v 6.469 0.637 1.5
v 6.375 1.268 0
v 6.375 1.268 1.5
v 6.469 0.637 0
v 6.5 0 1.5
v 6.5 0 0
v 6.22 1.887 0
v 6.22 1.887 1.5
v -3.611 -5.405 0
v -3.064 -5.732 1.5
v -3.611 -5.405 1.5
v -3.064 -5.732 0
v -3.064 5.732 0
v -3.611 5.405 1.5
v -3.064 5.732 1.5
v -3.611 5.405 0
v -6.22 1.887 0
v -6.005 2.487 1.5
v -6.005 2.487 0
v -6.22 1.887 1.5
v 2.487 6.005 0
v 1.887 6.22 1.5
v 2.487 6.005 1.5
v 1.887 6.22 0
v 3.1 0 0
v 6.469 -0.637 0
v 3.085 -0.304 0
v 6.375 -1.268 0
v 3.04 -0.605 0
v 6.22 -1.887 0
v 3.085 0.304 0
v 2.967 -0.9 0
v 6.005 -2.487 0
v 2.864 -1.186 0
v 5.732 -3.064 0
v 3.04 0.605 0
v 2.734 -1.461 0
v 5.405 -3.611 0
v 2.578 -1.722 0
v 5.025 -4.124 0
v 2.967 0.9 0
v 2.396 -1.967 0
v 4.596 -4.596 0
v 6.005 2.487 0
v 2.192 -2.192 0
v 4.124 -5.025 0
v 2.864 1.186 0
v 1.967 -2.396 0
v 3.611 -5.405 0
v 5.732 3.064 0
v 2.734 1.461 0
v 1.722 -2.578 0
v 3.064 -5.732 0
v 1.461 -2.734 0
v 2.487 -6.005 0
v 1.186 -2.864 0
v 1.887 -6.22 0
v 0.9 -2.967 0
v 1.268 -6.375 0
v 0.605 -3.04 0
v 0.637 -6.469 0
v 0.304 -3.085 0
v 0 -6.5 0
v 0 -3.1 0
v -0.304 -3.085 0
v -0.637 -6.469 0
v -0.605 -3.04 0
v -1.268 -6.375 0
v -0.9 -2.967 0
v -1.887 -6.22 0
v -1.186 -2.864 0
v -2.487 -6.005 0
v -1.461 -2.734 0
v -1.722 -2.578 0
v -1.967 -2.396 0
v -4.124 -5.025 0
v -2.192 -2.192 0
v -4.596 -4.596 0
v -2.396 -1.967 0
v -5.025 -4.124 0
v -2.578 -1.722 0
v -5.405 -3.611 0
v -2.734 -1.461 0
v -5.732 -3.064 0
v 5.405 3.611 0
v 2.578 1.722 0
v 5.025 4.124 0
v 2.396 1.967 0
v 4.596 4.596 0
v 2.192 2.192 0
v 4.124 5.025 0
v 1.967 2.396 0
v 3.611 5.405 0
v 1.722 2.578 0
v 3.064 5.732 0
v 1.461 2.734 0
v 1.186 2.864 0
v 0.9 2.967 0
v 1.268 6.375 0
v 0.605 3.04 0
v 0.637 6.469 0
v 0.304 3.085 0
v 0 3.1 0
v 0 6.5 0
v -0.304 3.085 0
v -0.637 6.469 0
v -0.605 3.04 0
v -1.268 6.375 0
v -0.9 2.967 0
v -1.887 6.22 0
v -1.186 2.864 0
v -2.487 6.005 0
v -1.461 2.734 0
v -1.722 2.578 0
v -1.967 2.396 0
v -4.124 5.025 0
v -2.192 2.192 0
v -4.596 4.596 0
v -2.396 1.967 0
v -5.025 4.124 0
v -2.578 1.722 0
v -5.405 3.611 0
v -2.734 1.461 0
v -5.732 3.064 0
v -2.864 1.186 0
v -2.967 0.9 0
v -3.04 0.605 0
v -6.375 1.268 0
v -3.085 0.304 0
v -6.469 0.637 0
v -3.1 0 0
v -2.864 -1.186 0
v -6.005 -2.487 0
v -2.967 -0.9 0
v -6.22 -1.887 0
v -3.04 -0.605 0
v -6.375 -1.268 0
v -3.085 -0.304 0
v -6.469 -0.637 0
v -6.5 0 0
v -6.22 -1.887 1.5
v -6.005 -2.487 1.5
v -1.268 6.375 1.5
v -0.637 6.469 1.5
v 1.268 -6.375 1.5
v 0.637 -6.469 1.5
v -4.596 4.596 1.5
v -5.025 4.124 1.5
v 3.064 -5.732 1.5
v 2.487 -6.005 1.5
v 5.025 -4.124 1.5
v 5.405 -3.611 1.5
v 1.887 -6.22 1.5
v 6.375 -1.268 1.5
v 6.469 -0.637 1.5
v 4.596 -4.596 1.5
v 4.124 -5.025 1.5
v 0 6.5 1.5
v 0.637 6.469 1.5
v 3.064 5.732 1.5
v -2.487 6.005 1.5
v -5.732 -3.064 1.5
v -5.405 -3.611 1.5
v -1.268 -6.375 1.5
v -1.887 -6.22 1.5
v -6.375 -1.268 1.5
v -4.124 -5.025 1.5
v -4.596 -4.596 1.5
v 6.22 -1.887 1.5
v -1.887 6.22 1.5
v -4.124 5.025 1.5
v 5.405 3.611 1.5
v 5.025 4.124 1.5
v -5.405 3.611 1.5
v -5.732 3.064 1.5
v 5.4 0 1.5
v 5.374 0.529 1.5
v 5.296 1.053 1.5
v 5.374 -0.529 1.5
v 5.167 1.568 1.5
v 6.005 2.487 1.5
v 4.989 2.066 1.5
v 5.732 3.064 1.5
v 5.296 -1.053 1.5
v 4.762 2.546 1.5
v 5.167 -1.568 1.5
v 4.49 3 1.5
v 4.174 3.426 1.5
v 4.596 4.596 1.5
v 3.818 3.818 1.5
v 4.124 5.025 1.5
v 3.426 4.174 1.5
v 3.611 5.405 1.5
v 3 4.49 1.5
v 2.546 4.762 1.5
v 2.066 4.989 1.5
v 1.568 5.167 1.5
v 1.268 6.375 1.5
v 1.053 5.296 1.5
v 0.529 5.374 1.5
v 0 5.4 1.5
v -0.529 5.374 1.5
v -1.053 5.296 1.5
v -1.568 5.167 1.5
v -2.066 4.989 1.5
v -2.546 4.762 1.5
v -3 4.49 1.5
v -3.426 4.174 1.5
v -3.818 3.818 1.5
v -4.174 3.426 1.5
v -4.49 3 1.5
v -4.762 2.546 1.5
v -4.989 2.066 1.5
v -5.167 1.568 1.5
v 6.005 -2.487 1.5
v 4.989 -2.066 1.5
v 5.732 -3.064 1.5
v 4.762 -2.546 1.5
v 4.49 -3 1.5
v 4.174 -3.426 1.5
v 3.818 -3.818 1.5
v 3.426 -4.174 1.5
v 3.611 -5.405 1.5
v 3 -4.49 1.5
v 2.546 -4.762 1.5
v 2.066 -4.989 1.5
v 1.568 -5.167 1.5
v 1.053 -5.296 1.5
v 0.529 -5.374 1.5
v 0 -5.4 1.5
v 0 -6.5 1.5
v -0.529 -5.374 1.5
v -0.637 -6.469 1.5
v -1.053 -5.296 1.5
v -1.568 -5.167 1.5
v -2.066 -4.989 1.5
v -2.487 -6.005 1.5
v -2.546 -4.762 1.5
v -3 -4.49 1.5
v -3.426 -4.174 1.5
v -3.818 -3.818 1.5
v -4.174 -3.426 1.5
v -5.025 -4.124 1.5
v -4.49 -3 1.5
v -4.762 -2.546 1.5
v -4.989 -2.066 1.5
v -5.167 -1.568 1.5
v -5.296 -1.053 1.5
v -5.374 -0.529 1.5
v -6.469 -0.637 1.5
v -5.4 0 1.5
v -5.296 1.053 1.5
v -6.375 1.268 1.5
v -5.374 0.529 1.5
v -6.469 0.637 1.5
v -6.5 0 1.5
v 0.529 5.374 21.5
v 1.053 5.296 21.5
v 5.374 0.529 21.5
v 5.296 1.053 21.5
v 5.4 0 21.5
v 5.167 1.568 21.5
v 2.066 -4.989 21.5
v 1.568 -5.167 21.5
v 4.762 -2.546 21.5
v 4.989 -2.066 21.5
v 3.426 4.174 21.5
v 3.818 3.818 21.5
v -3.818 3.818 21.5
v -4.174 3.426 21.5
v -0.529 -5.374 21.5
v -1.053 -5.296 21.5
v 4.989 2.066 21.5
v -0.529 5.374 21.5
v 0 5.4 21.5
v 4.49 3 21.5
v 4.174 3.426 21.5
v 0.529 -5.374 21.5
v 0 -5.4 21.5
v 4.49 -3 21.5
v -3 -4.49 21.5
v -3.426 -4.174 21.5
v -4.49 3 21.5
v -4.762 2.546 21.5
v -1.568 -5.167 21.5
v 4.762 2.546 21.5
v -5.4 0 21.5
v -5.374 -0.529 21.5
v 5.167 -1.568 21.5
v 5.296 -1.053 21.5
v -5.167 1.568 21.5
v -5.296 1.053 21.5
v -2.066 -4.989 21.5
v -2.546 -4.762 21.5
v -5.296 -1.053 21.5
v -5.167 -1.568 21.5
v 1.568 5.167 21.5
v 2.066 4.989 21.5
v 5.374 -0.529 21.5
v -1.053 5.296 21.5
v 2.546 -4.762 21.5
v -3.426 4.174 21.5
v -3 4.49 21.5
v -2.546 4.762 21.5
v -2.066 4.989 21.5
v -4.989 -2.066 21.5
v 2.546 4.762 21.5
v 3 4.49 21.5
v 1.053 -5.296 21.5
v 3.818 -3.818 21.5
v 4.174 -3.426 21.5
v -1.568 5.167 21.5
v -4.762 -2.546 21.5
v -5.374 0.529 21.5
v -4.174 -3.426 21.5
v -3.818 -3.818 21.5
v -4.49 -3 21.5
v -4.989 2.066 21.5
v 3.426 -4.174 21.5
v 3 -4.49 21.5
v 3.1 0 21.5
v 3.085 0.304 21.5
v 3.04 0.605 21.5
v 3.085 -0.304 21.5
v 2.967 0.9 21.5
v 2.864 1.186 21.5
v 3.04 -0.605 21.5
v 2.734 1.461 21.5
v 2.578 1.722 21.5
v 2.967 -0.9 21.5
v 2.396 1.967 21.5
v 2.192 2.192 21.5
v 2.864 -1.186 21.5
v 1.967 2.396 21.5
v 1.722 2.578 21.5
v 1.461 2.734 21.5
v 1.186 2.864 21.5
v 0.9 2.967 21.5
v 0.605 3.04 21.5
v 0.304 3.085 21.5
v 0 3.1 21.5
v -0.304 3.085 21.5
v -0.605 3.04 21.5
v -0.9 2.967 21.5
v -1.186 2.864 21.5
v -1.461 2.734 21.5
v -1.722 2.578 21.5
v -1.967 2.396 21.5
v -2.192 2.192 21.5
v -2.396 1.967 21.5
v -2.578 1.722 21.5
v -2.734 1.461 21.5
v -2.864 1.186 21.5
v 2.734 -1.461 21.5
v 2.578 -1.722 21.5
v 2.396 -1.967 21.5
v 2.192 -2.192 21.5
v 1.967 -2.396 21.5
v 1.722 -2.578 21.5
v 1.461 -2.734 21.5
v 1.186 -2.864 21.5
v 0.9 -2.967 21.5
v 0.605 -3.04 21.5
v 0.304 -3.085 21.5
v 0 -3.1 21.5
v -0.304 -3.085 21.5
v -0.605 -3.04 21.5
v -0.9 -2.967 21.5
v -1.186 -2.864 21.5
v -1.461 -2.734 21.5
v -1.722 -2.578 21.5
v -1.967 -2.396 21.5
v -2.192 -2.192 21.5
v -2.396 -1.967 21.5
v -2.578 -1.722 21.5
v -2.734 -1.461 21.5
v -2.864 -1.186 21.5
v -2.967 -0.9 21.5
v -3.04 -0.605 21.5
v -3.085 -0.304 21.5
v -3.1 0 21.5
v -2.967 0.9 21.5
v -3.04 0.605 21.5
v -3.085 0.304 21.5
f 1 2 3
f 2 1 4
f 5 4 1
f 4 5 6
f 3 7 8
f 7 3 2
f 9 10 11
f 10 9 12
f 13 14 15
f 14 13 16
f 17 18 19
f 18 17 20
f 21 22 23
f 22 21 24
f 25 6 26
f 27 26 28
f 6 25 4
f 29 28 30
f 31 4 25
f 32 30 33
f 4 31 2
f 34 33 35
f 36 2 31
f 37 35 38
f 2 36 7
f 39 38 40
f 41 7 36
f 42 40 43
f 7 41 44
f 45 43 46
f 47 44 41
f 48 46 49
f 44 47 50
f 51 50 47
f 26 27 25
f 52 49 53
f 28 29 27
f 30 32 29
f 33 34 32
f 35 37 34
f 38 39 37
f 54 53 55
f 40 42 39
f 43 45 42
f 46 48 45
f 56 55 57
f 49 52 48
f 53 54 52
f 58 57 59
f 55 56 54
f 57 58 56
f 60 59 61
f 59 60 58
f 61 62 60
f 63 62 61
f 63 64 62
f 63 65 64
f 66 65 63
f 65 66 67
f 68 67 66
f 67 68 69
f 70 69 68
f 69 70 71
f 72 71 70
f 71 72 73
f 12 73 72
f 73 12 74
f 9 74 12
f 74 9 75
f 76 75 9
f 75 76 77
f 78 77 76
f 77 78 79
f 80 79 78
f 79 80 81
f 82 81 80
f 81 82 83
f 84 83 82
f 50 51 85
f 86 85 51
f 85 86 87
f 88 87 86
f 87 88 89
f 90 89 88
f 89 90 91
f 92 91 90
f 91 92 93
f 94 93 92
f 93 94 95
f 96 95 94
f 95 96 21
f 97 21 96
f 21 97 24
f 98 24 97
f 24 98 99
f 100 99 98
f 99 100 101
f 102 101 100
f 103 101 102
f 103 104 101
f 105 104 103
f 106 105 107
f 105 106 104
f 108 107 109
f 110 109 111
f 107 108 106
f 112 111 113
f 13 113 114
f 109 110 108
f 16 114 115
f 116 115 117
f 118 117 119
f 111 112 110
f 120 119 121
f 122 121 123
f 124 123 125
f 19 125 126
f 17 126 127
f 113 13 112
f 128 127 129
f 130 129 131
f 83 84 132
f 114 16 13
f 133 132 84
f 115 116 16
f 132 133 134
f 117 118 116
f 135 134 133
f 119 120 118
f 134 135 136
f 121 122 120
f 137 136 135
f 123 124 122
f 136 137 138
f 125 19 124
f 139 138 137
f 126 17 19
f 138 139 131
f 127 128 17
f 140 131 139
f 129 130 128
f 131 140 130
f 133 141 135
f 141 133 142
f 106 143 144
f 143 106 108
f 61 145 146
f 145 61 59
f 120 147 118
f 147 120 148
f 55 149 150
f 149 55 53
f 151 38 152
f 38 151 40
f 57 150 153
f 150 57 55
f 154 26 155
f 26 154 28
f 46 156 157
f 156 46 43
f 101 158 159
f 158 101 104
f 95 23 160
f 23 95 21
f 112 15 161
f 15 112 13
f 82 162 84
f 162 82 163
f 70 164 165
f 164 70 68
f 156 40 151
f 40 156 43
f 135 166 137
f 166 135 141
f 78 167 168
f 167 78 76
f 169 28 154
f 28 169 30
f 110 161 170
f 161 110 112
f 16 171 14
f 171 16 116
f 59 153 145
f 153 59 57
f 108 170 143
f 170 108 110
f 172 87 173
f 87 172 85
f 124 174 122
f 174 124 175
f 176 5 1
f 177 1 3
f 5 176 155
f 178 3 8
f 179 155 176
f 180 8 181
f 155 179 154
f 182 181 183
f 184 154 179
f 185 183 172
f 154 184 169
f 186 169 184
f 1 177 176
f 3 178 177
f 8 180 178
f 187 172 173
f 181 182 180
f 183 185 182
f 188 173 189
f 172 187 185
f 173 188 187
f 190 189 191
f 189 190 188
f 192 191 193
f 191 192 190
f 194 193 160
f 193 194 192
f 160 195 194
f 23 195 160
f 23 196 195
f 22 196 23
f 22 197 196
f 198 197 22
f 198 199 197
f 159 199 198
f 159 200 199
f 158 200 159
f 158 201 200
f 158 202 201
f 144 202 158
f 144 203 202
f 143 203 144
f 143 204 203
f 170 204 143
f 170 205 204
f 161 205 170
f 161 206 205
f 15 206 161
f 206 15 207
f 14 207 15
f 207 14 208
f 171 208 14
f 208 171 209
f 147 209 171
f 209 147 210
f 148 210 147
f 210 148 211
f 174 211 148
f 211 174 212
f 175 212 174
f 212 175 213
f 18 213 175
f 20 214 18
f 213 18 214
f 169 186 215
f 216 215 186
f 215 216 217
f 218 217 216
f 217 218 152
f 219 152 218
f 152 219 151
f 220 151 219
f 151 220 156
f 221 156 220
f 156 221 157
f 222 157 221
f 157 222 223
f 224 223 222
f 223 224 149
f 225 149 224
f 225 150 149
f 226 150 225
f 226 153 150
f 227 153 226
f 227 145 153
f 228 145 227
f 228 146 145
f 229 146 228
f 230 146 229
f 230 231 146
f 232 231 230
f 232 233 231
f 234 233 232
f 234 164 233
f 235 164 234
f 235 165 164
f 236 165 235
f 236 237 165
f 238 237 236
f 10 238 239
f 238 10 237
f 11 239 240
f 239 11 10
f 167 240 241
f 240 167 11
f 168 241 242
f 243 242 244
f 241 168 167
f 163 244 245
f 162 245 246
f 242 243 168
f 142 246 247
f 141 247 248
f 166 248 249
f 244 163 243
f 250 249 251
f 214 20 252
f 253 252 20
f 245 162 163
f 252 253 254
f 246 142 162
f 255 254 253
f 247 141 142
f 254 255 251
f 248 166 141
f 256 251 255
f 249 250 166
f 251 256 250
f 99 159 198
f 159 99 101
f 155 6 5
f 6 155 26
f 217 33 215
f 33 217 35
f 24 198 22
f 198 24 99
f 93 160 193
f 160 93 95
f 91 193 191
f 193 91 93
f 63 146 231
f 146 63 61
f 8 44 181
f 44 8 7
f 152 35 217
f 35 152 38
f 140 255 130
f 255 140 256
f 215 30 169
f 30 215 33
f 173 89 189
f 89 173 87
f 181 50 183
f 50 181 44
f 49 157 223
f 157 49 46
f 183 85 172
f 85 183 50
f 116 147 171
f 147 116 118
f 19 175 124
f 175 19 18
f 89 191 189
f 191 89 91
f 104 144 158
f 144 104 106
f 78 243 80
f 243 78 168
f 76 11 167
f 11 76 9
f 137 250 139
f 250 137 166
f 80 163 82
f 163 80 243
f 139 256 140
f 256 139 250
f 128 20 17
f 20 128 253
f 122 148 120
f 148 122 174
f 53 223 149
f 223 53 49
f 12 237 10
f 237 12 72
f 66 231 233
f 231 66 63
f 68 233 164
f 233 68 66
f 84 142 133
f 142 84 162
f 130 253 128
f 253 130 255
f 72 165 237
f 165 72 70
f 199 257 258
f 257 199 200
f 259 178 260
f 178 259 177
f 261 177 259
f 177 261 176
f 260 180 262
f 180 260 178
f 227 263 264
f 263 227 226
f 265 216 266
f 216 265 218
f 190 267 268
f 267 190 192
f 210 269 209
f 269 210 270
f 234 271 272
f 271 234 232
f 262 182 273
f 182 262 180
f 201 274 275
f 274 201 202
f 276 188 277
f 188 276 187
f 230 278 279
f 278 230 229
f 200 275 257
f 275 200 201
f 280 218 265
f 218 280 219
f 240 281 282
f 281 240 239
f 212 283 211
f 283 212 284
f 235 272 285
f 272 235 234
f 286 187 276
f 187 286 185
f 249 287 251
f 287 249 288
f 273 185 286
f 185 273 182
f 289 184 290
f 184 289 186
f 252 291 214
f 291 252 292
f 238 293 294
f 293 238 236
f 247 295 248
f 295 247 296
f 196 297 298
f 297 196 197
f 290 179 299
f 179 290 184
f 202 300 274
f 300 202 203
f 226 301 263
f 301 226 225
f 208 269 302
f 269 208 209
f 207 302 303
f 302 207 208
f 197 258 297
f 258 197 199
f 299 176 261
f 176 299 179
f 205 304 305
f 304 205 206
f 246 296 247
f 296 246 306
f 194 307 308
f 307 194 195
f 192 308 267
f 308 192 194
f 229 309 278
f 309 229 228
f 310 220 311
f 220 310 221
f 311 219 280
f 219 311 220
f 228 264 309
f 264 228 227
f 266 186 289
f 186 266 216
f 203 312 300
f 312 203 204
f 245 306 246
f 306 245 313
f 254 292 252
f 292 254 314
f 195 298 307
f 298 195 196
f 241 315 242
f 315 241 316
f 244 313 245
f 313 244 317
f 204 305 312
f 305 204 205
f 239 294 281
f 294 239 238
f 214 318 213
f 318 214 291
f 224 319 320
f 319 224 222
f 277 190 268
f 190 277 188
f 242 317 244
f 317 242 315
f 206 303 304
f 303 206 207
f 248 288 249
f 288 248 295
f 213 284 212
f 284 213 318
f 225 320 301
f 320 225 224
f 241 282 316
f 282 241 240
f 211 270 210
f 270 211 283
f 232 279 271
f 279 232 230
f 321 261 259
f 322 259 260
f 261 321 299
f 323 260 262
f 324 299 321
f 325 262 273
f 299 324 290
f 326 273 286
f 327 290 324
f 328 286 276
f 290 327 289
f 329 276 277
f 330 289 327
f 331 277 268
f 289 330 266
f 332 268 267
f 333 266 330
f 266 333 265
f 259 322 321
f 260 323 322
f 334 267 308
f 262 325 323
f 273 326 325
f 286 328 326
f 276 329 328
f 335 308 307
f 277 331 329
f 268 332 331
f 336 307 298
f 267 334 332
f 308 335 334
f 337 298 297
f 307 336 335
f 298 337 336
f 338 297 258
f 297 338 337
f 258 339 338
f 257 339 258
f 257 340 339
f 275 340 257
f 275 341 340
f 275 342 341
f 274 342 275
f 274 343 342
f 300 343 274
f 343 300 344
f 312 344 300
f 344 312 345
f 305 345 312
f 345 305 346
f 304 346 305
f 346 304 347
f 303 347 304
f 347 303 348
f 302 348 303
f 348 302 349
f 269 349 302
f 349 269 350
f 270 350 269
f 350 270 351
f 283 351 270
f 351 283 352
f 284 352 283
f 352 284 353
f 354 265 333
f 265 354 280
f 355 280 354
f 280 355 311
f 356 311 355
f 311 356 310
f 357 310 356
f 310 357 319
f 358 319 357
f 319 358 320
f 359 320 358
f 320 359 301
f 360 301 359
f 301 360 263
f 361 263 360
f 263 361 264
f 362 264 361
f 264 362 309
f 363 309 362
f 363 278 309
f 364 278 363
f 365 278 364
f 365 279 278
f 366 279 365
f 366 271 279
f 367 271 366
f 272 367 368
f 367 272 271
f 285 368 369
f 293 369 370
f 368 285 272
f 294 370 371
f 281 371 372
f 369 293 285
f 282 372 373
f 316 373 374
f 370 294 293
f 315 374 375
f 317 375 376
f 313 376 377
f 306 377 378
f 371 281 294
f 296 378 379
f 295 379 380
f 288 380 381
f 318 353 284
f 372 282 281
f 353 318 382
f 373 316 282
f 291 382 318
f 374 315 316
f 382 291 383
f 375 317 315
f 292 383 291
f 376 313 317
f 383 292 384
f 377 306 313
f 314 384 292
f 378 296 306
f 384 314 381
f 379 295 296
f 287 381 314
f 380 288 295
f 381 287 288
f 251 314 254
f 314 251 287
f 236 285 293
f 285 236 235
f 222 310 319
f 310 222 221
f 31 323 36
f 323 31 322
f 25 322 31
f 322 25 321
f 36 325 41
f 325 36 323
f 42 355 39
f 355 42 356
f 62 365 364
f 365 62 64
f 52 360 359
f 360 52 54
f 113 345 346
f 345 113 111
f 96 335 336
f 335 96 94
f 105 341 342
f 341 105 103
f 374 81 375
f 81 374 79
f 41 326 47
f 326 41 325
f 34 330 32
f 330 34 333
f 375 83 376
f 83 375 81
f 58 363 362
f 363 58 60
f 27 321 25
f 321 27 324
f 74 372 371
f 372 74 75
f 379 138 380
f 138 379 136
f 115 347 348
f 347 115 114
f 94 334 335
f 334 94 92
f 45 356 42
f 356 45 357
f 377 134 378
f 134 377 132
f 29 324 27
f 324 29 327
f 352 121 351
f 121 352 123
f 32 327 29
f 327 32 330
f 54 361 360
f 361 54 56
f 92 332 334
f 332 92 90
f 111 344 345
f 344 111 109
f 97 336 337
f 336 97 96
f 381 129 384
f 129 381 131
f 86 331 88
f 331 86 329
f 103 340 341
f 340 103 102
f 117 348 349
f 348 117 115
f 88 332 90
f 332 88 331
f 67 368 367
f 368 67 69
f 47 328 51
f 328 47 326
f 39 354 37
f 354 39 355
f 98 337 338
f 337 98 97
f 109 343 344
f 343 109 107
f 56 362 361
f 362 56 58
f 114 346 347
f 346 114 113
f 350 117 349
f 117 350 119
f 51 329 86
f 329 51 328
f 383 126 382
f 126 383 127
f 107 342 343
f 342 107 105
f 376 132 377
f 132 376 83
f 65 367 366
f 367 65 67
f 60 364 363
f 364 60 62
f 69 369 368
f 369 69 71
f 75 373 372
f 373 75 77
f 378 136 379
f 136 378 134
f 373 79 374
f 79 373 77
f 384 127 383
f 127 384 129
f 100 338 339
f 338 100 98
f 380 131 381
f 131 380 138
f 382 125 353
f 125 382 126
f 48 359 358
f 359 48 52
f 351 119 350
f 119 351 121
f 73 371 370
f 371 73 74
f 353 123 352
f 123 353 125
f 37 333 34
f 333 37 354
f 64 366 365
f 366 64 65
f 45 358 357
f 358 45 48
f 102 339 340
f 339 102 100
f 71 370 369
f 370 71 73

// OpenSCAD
// Adapter sleeve: 0.2 mL PCR tube in a 1.5 mL rack hole
// Print orientation: collar on bed (z = 0), sleeve body rises to z = 21.5

$fn = 64;

// --- Dimensions (mm) ---
collar_d      = 13;    // collar outer diameter
collar_h      = 1.5;   // collar thickness (z = 0 to 1.5)
sleeve_od     = 10.8;  // sleeve body outer diameter
sleeve_h      = 20;    // sleeve body height above collar (z = 1.5 to 21.5)
bore_d        = 6.2;   // straight through-bore diameter
eps           = 0.5;   // cutter overshoot past faces

total_h = collar_h + sleeve_h;  // 21.5 mm overall height

difference() {
    union() {
        // Collar
        cylinder(d = collar_d, h = collar_h);
        // Sleeve body (slightly overlapping the collar for a clean union)
        translate([0, 0, collar_h - 0.01])
            cylinder(d = sleeve_od, h = sleeve_h + 0.01);
    }
    // Full-height bore, open at both ends
    translate([0, 0, -eps])
        cylinder(d = bore_d, h = total_h + 2 * eps);
}
